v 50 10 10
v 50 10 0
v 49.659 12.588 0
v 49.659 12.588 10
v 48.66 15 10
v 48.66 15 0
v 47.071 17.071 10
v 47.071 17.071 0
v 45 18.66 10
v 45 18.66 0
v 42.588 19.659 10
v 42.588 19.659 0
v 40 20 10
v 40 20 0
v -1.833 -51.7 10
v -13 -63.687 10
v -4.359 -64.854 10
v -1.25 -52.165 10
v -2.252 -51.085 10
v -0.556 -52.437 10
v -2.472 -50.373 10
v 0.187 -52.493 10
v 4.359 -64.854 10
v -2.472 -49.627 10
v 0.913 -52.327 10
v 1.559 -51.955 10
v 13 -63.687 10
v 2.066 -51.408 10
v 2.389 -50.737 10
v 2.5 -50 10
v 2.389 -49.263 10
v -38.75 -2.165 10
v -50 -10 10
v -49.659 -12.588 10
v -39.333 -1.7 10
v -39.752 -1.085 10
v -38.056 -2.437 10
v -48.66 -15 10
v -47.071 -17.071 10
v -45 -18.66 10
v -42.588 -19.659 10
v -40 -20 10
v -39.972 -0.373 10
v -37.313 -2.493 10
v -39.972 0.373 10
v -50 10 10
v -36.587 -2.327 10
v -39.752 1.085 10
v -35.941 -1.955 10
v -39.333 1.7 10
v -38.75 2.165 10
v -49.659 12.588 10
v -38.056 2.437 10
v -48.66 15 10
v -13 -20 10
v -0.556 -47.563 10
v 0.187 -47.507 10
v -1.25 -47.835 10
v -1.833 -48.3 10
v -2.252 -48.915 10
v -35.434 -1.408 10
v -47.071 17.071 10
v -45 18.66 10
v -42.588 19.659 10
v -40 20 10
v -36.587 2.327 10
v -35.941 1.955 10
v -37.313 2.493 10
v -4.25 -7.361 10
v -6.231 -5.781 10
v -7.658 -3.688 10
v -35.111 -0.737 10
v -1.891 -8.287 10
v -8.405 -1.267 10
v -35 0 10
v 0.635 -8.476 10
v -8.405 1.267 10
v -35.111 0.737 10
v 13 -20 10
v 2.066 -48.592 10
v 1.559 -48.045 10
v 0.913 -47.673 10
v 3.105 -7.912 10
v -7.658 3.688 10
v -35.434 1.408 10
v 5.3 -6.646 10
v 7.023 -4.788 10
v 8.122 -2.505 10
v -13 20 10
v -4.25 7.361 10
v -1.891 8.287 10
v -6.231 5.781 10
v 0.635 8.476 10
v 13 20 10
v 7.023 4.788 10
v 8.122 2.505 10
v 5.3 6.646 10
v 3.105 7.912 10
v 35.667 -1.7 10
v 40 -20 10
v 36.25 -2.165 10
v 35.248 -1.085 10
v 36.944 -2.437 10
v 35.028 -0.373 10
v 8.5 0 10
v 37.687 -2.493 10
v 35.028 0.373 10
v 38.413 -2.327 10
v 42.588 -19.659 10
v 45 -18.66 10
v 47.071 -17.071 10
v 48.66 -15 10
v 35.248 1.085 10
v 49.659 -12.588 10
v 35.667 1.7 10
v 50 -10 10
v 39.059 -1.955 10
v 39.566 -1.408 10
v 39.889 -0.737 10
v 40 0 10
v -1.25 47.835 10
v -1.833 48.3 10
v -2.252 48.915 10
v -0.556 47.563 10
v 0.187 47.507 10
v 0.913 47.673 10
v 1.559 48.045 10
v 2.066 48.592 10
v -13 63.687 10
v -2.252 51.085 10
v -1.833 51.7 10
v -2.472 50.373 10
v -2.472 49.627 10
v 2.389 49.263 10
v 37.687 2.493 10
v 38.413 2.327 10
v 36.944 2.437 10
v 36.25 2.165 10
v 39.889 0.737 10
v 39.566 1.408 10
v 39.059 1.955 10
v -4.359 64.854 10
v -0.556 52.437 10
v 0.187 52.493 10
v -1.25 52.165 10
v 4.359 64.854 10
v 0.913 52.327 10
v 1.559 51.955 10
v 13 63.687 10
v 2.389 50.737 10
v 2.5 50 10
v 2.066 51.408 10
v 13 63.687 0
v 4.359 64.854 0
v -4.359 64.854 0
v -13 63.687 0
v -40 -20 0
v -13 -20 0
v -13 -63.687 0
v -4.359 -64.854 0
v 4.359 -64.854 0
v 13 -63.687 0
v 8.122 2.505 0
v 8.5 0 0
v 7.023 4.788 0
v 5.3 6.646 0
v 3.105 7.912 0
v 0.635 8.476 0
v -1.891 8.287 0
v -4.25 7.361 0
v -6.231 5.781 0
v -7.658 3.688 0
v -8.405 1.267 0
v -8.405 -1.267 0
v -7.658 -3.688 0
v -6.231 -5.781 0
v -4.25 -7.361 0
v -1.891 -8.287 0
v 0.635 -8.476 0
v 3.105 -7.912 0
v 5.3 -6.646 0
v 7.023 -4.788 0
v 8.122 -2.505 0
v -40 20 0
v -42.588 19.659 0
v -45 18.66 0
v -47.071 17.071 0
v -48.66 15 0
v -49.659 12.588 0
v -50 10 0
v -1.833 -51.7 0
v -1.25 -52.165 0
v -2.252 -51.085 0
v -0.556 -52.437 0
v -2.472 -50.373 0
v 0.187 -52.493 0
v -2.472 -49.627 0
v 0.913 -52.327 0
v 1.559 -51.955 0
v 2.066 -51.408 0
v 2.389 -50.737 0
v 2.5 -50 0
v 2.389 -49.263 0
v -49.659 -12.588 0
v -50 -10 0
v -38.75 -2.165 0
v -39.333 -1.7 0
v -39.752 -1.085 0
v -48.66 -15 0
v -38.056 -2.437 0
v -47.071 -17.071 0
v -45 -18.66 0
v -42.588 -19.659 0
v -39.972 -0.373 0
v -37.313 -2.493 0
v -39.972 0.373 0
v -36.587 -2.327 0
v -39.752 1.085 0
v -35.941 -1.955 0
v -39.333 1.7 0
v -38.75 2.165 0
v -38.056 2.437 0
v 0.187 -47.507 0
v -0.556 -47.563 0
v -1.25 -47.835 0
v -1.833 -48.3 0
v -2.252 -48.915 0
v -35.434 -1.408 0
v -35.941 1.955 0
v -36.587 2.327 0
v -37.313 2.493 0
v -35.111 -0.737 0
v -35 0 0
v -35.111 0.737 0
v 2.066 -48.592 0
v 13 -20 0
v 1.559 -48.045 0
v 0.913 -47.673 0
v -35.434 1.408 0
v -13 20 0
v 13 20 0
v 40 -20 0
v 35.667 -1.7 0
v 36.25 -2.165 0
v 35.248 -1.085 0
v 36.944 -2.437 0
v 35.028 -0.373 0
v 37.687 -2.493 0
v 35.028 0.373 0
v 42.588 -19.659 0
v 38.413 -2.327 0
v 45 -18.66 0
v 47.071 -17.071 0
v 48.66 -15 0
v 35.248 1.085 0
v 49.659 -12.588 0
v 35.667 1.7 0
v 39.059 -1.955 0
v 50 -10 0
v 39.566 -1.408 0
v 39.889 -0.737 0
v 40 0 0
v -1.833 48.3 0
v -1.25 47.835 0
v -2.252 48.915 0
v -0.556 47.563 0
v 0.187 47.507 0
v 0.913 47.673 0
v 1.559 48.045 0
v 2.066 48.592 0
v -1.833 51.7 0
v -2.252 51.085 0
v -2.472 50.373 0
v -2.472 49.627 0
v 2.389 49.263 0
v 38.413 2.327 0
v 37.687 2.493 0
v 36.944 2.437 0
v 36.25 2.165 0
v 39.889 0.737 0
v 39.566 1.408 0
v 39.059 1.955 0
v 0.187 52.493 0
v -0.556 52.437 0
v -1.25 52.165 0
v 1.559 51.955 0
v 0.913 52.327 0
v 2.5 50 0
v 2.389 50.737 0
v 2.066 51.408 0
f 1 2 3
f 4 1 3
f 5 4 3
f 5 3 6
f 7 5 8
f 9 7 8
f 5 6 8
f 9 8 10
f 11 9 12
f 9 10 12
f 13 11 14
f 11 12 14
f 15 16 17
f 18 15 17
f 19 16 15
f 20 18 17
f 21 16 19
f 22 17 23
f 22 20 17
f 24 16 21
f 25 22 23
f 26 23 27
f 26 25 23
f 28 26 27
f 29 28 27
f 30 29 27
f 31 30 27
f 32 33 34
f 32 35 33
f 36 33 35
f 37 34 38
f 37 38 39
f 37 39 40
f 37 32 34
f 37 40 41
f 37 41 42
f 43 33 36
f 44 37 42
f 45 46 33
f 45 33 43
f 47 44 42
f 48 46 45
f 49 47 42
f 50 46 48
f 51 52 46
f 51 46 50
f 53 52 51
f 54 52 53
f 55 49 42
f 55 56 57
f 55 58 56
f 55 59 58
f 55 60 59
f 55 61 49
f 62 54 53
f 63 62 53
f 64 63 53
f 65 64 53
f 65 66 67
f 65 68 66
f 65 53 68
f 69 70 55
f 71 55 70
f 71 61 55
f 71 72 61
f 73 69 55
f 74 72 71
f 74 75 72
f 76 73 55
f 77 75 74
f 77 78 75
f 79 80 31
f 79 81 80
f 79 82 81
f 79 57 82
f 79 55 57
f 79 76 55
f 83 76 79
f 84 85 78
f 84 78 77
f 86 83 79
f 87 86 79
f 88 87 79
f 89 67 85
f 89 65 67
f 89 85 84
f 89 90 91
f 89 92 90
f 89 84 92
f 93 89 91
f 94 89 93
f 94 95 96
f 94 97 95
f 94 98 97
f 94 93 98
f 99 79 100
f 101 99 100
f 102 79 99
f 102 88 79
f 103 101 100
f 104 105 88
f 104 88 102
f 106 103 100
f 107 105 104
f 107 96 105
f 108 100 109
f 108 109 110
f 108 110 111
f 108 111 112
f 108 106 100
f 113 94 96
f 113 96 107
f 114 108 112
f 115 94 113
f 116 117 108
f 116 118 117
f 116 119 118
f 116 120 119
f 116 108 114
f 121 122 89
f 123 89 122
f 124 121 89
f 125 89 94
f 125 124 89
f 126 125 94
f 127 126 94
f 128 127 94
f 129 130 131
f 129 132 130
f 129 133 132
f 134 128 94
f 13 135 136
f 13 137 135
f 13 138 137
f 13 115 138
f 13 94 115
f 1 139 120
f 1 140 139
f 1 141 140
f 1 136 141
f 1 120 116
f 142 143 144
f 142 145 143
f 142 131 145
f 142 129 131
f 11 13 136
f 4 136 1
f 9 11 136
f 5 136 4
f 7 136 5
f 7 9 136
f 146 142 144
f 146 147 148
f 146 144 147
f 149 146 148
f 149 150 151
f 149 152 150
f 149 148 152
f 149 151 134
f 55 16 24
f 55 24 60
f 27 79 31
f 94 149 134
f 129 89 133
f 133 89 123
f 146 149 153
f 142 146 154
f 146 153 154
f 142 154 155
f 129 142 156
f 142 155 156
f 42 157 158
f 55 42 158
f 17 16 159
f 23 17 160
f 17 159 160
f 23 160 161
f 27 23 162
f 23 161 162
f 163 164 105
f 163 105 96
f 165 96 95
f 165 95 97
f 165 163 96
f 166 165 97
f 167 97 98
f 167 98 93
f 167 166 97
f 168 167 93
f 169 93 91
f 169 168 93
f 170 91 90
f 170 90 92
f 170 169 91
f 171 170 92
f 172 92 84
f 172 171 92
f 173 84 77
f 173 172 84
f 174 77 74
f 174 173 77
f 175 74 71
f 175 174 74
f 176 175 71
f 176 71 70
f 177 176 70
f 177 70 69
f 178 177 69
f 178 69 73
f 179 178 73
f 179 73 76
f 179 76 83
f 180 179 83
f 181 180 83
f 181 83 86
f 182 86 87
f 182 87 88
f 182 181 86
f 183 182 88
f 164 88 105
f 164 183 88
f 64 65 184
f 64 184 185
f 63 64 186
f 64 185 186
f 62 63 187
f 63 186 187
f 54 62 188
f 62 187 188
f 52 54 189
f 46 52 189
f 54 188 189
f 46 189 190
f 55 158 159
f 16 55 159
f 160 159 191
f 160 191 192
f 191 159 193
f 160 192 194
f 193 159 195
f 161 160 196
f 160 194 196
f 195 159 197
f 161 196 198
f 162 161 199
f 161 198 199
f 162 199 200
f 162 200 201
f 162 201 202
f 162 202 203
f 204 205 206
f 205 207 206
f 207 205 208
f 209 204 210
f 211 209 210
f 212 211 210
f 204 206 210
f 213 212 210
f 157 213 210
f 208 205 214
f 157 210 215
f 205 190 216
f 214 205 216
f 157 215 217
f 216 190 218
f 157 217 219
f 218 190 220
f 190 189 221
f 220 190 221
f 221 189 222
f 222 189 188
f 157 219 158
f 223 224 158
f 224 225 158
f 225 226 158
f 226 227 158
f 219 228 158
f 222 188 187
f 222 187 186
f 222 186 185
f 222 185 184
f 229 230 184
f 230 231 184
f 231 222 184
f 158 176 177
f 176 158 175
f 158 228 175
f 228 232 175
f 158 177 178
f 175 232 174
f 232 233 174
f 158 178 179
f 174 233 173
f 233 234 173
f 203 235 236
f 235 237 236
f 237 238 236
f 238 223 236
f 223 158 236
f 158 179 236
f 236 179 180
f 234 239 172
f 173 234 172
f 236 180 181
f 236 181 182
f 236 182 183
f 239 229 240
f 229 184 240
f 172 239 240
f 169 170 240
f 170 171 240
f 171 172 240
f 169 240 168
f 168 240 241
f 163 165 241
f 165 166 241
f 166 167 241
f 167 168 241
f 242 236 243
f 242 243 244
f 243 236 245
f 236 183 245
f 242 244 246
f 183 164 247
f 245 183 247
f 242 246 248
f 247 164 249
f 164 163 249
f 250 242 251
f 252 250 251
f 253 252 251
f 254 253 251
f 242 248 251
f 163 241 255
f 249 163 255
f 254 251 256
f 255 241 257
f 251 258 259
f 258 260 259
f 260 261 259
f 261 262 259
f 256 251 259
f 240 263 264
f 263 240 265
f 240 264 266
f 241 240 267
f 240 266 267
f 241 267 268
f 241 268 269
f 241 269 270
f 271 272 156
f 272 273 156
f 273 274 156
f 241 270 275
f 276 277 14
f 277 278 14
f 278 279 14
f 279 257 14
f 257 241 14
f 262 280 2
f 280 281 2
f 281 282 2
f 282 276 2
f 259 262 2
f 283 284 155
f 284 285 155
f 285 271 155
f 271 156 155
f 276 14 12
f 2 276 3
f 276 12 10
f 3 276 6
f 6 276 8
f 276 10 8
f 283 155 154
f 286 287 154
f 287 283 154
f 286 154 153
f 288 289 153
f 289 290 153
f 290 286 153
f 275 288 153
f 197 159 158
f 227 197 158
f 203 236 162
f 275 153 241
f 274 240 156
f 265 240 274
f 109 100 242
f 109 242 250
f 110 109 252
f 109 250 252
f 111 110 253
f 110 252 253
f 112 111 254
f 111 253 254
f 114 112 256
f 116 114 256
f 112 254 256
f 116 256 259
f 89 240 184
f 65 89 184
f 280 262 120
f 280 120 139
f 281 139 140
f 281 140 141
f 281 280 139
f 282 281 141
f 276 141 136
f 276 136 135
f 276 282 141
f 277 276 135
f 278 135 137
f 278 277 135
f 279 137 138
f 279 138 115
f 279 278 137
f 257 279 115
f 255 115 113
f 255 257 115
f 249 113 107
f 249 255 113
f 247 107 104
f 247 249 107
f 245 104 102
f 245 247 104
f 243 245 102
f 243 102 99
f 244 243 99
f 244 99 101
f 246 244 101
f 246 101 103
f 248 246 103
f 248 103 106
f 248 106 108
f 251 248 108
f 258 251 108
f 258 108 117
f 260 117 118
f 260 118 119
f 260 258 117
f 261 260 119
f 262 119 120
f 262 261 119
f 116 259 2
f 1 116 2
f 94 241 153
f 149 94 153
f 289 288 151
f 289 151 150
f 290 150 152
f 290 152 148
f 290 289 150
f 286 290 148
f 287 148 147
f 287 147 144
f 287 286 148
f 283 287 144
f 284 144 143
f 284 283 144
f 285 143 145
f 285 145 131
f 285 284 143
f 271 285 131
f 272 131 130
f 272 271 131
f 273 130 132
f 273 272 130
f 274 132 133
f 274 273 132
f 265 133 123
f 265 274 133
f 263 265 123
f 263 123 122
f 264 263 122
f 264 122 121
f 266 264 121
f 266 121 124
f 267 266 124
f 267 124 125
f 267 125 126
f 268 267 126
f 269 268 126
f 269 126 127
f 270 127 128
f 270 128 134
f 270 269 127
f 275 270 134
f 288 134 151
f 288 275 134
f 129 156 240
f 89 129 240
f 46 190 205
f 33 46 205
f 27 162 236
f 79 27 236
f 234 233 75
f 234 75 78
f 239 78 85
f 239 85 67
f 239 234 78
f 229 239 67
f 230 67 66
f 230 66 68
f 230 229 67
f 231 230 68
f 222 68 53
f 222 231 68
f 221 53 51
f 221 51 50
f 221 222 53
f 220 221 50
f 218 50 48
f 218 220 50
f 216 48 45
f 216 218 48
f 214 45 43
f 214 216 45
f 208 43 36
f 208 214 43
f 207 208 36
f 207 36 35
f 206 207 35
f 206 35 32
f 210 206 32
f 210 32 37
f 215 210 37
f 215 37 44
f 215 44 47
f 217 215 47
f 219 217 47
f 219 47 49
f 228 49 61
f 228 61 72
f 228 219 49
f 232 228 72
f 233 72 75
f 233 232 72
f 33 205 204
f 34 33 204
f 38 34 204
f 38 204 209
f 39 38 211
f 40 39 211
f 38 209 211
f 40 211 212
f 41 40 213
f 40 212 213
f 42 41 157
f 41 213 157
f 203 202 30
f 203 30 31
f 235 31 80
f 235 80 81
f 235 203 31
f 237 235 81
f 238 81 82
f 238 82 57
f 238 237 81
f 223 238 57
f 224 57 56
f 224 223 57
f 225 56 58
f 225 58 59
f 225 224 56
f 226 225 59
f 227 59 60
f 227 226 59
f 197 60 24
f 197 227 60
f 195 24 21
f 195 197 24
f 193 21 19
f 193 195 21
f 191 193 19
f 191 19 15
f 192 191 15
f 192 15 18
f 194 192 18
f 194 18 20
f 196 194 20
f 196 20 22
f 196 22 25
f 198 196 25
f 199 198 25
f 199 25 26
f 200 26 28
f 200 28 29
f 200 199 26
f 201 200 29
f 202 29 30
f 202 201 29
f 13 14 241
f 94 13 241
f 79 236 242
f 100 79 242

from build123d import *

# Parameters (mm, degrees)
SKETCH1_R           = 2.5
SKETCH1_R_2         = 8.5
BOSS_EXTRUDE1_DEPTH = 10


with BuildPart() as part:
    # Sketch1 → Boss-Extrude1 (new body)
    with BuildSketch(Plane.XY):
        with BuildLine():
            Line((-13, 20), (-40, 20))
            ThreePointArc((-40, 20), (-47.071067812, 17.071067812), (-50, 10))
            Line((-50, 10), (-50, -10))
            ThreePointArc((-50, -10), (-47.071067812, -17.071067812), (-40, -20))
            Line((-40, -20), (-13, -20))
            Line((-13, -20), (-13, -63.686733312))
            ThreePointArc((-13, -63.686733312), (0, -65), (13, -63.686733312))
            Line((13, -63.686733312), (13, -20))
            Line((13, -20), (40, -20))
            ThreePointArc((40, -20), (47.071067812, -17.071067812), (50, -10))
            Line((50, -10), (50, 10))
            ThreePointArc((50, 10), (47.071067812, 17.071067812), (40, 20))
            Line((40, 20), (13, 20))
            Line((13, 20), (13, 63.686733312))
            ThreePointArc((13, 63.686733312), (0, 65), (-13, 63.686733312))
            Line((-13, 63.686733312), (-13, 20))
        make_face()
        with Locations((-37.5, 0)):
            Circle(SKETCH1_R, mode=Mode.SUBTRACT)
        with Locations((0, -50)):
            Circle(SKETCH1_R, mode=Mode.SUBTRACT)
        with Locations((37.5, 0)):
            Circle(SKETCH1_R, mode=Mode.SUBTRACT)
        with Locations((0, 50)):
            Circle(SKETCH1_R, mode=Mode.SUBTRACT)
        Circle(SKETCH1_R_2, mode=Mode.SUBTRACT)
    extrude(amount=BOSS_EXTRUDE1_DEPTH)


solid = part.part
